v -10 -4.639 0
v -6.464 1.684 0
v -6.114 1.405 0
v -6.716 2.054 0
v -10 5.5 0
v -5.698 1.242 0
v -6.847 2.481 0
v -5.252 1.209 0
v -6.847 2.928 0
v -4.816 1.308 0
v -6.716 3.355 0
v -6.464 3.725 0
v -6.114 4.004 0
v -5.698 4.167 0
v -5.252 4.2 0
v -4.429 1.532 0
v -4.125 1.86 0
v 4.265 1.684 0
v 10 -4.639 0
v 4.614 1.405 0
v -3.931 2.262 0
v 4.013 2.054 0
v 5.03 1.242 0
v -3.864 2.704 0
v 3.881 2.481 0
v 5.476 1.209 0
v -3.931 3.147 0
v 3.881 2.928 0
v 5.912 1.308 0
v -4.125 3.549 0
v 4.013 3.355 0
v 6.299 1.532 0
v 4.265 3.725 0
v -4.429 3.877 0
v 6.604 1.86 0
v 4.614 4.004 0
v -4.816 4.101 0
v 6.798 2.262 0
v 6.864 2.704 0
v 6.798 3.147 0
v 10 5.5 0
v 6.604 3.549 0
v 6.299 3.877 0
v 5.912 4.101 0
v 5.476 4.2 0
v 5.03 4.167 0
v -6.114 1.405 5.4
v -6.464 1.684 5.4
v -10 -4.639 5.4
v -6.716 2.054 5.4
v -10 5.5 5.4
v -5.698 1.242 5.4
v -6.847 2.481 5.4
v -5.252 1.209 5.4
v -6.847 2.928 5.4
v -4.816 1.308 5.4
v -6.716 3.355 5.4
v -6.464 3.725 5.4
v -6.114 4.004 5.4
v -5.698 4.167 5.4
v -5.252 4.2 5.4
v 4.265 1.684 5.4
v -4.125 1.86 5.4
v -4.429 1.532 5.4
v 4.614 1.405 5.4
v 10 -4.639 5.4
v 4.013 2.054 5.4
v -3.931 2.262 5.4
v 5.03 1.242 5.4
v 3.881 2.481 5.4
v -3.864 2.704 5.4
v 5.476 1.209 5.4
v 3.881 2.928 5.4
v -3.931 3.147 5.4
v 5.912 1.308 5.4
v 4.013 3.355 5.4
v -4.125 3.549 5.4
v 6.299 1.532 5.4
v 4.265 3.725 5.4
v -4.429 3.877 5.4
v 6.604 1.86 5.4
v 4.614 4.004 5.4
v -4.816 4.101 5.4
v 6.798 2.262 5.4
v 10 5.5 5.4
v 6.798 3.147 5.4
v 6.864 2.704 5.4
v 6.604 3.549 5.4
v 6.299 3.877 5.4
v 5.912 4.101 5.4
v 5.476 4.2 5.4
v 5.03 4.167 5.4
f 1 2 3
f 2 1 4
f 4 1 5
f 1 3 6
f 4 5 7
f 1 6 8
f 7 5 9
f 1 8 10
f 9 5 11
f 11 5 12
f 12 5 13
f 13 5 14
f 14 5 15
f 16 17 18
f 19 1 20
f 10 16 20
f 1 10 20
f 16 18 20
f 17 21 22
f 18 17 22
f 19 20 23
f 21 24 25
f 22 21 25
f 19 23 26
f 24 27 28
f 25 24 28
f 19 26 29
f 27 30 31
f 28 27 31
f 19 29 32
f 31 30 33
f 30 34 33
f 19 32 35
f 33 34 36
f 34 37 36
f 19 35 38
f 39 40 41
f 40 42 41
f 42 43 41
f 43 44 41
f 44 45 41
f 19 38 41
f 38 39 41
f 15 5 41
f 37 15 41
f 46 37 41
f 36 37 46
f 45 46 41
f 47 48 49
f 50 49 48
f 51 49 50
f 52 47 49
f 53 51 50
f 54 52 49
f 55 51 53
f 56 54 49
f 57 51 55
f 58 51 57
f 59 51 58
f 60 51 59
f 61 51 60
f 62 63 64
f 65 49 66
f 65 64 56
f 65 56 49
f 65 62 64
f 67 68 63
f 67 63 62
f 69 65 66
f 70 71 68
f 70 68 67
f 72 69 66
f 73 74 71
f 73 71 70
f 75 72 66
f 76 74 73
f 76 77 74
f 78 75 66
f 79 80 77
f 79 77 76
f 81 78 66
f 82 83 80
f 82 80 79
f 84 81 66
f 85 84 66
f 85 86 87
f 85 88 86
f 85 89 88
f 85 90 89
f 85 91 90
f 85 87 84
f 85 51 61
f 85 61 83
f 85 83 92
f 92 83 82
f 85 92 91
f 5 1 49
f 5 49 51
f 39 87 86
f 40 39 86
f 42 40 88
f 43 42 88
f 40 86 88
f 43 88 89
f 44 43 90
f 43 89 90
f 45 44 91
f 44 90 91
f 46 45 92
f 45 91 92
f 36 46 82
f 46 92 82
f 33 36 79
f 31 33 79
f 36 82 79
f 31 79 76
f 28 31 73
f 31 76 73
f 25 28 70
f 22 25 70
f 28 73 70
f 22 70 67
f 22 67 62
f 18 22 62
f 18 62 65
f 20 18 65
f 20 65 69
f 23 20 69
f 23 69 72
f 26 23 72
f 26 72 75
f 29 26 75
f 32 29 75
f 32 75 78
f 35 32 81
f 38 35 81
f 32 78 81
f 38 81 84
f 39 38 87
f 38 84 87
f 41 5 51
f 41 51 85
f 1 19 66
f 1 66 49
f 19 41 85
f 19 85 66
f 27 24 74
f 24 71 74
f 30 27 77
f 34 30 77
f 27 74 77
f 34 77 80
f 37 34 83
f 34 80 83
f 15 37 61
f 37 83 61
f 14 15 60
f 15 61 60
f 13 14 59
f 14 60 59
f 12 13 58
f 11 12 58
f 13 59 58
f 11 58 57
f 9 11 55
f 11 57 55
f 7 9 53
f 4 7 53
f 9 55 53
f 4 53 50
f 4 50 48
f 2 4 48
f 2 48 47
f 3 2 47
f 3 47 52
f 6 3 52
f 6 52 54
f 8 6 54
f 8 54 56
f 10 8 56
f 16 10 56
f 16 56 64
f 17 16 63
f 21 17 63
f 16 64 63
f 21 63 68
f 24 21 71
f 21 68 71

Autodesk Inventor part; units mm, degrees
ref_plane "YZ Plane" through (0, 0, 0) normal (1, 0, 0) x (0, 1, 0)
ref_plane "XZ Plane" through (0, 0, 0) normal (0, 1, 0) x (-1, 0, 0)
ref_plane "XY Plane" through (0, 0, 0) normal (0, 0, 1) x (1, 0, 0)
sketch "草图1" plane through (0, 0, 0) normal (0, 0, 1) x (1, 0, 0)
  line L0 (10, -4.6392) -> (-10, -4.6392)
  line L1 (-10, -4.6392) -> (-10, 5.5)
  line L2 (-10, 5.5) -> (10, 5.5)
  line L3 (10, 5.5) -> (10, -4.6392)
  point P0 (0, 0)
  dimension "d0" = 20
  dimension "d7" = 10.1392
extrude "拉伸1" add sketch "草图1" along normal blind 5.4
sketch "草图2" plane through (0, 0, 5.4) normal (0, 0, 1) x (1, 0, 0)
  circle A0 centre (-5.3642, 2.7045) radius 1.5 projected
  circle A1 centre (5.3642, 2.7045) radius 1.5 projected
  point P0 (0, 0)
extrude "拉伸2" cut sketch "草图2" against normal blind 21.65
properties part number "攻单夹片"
